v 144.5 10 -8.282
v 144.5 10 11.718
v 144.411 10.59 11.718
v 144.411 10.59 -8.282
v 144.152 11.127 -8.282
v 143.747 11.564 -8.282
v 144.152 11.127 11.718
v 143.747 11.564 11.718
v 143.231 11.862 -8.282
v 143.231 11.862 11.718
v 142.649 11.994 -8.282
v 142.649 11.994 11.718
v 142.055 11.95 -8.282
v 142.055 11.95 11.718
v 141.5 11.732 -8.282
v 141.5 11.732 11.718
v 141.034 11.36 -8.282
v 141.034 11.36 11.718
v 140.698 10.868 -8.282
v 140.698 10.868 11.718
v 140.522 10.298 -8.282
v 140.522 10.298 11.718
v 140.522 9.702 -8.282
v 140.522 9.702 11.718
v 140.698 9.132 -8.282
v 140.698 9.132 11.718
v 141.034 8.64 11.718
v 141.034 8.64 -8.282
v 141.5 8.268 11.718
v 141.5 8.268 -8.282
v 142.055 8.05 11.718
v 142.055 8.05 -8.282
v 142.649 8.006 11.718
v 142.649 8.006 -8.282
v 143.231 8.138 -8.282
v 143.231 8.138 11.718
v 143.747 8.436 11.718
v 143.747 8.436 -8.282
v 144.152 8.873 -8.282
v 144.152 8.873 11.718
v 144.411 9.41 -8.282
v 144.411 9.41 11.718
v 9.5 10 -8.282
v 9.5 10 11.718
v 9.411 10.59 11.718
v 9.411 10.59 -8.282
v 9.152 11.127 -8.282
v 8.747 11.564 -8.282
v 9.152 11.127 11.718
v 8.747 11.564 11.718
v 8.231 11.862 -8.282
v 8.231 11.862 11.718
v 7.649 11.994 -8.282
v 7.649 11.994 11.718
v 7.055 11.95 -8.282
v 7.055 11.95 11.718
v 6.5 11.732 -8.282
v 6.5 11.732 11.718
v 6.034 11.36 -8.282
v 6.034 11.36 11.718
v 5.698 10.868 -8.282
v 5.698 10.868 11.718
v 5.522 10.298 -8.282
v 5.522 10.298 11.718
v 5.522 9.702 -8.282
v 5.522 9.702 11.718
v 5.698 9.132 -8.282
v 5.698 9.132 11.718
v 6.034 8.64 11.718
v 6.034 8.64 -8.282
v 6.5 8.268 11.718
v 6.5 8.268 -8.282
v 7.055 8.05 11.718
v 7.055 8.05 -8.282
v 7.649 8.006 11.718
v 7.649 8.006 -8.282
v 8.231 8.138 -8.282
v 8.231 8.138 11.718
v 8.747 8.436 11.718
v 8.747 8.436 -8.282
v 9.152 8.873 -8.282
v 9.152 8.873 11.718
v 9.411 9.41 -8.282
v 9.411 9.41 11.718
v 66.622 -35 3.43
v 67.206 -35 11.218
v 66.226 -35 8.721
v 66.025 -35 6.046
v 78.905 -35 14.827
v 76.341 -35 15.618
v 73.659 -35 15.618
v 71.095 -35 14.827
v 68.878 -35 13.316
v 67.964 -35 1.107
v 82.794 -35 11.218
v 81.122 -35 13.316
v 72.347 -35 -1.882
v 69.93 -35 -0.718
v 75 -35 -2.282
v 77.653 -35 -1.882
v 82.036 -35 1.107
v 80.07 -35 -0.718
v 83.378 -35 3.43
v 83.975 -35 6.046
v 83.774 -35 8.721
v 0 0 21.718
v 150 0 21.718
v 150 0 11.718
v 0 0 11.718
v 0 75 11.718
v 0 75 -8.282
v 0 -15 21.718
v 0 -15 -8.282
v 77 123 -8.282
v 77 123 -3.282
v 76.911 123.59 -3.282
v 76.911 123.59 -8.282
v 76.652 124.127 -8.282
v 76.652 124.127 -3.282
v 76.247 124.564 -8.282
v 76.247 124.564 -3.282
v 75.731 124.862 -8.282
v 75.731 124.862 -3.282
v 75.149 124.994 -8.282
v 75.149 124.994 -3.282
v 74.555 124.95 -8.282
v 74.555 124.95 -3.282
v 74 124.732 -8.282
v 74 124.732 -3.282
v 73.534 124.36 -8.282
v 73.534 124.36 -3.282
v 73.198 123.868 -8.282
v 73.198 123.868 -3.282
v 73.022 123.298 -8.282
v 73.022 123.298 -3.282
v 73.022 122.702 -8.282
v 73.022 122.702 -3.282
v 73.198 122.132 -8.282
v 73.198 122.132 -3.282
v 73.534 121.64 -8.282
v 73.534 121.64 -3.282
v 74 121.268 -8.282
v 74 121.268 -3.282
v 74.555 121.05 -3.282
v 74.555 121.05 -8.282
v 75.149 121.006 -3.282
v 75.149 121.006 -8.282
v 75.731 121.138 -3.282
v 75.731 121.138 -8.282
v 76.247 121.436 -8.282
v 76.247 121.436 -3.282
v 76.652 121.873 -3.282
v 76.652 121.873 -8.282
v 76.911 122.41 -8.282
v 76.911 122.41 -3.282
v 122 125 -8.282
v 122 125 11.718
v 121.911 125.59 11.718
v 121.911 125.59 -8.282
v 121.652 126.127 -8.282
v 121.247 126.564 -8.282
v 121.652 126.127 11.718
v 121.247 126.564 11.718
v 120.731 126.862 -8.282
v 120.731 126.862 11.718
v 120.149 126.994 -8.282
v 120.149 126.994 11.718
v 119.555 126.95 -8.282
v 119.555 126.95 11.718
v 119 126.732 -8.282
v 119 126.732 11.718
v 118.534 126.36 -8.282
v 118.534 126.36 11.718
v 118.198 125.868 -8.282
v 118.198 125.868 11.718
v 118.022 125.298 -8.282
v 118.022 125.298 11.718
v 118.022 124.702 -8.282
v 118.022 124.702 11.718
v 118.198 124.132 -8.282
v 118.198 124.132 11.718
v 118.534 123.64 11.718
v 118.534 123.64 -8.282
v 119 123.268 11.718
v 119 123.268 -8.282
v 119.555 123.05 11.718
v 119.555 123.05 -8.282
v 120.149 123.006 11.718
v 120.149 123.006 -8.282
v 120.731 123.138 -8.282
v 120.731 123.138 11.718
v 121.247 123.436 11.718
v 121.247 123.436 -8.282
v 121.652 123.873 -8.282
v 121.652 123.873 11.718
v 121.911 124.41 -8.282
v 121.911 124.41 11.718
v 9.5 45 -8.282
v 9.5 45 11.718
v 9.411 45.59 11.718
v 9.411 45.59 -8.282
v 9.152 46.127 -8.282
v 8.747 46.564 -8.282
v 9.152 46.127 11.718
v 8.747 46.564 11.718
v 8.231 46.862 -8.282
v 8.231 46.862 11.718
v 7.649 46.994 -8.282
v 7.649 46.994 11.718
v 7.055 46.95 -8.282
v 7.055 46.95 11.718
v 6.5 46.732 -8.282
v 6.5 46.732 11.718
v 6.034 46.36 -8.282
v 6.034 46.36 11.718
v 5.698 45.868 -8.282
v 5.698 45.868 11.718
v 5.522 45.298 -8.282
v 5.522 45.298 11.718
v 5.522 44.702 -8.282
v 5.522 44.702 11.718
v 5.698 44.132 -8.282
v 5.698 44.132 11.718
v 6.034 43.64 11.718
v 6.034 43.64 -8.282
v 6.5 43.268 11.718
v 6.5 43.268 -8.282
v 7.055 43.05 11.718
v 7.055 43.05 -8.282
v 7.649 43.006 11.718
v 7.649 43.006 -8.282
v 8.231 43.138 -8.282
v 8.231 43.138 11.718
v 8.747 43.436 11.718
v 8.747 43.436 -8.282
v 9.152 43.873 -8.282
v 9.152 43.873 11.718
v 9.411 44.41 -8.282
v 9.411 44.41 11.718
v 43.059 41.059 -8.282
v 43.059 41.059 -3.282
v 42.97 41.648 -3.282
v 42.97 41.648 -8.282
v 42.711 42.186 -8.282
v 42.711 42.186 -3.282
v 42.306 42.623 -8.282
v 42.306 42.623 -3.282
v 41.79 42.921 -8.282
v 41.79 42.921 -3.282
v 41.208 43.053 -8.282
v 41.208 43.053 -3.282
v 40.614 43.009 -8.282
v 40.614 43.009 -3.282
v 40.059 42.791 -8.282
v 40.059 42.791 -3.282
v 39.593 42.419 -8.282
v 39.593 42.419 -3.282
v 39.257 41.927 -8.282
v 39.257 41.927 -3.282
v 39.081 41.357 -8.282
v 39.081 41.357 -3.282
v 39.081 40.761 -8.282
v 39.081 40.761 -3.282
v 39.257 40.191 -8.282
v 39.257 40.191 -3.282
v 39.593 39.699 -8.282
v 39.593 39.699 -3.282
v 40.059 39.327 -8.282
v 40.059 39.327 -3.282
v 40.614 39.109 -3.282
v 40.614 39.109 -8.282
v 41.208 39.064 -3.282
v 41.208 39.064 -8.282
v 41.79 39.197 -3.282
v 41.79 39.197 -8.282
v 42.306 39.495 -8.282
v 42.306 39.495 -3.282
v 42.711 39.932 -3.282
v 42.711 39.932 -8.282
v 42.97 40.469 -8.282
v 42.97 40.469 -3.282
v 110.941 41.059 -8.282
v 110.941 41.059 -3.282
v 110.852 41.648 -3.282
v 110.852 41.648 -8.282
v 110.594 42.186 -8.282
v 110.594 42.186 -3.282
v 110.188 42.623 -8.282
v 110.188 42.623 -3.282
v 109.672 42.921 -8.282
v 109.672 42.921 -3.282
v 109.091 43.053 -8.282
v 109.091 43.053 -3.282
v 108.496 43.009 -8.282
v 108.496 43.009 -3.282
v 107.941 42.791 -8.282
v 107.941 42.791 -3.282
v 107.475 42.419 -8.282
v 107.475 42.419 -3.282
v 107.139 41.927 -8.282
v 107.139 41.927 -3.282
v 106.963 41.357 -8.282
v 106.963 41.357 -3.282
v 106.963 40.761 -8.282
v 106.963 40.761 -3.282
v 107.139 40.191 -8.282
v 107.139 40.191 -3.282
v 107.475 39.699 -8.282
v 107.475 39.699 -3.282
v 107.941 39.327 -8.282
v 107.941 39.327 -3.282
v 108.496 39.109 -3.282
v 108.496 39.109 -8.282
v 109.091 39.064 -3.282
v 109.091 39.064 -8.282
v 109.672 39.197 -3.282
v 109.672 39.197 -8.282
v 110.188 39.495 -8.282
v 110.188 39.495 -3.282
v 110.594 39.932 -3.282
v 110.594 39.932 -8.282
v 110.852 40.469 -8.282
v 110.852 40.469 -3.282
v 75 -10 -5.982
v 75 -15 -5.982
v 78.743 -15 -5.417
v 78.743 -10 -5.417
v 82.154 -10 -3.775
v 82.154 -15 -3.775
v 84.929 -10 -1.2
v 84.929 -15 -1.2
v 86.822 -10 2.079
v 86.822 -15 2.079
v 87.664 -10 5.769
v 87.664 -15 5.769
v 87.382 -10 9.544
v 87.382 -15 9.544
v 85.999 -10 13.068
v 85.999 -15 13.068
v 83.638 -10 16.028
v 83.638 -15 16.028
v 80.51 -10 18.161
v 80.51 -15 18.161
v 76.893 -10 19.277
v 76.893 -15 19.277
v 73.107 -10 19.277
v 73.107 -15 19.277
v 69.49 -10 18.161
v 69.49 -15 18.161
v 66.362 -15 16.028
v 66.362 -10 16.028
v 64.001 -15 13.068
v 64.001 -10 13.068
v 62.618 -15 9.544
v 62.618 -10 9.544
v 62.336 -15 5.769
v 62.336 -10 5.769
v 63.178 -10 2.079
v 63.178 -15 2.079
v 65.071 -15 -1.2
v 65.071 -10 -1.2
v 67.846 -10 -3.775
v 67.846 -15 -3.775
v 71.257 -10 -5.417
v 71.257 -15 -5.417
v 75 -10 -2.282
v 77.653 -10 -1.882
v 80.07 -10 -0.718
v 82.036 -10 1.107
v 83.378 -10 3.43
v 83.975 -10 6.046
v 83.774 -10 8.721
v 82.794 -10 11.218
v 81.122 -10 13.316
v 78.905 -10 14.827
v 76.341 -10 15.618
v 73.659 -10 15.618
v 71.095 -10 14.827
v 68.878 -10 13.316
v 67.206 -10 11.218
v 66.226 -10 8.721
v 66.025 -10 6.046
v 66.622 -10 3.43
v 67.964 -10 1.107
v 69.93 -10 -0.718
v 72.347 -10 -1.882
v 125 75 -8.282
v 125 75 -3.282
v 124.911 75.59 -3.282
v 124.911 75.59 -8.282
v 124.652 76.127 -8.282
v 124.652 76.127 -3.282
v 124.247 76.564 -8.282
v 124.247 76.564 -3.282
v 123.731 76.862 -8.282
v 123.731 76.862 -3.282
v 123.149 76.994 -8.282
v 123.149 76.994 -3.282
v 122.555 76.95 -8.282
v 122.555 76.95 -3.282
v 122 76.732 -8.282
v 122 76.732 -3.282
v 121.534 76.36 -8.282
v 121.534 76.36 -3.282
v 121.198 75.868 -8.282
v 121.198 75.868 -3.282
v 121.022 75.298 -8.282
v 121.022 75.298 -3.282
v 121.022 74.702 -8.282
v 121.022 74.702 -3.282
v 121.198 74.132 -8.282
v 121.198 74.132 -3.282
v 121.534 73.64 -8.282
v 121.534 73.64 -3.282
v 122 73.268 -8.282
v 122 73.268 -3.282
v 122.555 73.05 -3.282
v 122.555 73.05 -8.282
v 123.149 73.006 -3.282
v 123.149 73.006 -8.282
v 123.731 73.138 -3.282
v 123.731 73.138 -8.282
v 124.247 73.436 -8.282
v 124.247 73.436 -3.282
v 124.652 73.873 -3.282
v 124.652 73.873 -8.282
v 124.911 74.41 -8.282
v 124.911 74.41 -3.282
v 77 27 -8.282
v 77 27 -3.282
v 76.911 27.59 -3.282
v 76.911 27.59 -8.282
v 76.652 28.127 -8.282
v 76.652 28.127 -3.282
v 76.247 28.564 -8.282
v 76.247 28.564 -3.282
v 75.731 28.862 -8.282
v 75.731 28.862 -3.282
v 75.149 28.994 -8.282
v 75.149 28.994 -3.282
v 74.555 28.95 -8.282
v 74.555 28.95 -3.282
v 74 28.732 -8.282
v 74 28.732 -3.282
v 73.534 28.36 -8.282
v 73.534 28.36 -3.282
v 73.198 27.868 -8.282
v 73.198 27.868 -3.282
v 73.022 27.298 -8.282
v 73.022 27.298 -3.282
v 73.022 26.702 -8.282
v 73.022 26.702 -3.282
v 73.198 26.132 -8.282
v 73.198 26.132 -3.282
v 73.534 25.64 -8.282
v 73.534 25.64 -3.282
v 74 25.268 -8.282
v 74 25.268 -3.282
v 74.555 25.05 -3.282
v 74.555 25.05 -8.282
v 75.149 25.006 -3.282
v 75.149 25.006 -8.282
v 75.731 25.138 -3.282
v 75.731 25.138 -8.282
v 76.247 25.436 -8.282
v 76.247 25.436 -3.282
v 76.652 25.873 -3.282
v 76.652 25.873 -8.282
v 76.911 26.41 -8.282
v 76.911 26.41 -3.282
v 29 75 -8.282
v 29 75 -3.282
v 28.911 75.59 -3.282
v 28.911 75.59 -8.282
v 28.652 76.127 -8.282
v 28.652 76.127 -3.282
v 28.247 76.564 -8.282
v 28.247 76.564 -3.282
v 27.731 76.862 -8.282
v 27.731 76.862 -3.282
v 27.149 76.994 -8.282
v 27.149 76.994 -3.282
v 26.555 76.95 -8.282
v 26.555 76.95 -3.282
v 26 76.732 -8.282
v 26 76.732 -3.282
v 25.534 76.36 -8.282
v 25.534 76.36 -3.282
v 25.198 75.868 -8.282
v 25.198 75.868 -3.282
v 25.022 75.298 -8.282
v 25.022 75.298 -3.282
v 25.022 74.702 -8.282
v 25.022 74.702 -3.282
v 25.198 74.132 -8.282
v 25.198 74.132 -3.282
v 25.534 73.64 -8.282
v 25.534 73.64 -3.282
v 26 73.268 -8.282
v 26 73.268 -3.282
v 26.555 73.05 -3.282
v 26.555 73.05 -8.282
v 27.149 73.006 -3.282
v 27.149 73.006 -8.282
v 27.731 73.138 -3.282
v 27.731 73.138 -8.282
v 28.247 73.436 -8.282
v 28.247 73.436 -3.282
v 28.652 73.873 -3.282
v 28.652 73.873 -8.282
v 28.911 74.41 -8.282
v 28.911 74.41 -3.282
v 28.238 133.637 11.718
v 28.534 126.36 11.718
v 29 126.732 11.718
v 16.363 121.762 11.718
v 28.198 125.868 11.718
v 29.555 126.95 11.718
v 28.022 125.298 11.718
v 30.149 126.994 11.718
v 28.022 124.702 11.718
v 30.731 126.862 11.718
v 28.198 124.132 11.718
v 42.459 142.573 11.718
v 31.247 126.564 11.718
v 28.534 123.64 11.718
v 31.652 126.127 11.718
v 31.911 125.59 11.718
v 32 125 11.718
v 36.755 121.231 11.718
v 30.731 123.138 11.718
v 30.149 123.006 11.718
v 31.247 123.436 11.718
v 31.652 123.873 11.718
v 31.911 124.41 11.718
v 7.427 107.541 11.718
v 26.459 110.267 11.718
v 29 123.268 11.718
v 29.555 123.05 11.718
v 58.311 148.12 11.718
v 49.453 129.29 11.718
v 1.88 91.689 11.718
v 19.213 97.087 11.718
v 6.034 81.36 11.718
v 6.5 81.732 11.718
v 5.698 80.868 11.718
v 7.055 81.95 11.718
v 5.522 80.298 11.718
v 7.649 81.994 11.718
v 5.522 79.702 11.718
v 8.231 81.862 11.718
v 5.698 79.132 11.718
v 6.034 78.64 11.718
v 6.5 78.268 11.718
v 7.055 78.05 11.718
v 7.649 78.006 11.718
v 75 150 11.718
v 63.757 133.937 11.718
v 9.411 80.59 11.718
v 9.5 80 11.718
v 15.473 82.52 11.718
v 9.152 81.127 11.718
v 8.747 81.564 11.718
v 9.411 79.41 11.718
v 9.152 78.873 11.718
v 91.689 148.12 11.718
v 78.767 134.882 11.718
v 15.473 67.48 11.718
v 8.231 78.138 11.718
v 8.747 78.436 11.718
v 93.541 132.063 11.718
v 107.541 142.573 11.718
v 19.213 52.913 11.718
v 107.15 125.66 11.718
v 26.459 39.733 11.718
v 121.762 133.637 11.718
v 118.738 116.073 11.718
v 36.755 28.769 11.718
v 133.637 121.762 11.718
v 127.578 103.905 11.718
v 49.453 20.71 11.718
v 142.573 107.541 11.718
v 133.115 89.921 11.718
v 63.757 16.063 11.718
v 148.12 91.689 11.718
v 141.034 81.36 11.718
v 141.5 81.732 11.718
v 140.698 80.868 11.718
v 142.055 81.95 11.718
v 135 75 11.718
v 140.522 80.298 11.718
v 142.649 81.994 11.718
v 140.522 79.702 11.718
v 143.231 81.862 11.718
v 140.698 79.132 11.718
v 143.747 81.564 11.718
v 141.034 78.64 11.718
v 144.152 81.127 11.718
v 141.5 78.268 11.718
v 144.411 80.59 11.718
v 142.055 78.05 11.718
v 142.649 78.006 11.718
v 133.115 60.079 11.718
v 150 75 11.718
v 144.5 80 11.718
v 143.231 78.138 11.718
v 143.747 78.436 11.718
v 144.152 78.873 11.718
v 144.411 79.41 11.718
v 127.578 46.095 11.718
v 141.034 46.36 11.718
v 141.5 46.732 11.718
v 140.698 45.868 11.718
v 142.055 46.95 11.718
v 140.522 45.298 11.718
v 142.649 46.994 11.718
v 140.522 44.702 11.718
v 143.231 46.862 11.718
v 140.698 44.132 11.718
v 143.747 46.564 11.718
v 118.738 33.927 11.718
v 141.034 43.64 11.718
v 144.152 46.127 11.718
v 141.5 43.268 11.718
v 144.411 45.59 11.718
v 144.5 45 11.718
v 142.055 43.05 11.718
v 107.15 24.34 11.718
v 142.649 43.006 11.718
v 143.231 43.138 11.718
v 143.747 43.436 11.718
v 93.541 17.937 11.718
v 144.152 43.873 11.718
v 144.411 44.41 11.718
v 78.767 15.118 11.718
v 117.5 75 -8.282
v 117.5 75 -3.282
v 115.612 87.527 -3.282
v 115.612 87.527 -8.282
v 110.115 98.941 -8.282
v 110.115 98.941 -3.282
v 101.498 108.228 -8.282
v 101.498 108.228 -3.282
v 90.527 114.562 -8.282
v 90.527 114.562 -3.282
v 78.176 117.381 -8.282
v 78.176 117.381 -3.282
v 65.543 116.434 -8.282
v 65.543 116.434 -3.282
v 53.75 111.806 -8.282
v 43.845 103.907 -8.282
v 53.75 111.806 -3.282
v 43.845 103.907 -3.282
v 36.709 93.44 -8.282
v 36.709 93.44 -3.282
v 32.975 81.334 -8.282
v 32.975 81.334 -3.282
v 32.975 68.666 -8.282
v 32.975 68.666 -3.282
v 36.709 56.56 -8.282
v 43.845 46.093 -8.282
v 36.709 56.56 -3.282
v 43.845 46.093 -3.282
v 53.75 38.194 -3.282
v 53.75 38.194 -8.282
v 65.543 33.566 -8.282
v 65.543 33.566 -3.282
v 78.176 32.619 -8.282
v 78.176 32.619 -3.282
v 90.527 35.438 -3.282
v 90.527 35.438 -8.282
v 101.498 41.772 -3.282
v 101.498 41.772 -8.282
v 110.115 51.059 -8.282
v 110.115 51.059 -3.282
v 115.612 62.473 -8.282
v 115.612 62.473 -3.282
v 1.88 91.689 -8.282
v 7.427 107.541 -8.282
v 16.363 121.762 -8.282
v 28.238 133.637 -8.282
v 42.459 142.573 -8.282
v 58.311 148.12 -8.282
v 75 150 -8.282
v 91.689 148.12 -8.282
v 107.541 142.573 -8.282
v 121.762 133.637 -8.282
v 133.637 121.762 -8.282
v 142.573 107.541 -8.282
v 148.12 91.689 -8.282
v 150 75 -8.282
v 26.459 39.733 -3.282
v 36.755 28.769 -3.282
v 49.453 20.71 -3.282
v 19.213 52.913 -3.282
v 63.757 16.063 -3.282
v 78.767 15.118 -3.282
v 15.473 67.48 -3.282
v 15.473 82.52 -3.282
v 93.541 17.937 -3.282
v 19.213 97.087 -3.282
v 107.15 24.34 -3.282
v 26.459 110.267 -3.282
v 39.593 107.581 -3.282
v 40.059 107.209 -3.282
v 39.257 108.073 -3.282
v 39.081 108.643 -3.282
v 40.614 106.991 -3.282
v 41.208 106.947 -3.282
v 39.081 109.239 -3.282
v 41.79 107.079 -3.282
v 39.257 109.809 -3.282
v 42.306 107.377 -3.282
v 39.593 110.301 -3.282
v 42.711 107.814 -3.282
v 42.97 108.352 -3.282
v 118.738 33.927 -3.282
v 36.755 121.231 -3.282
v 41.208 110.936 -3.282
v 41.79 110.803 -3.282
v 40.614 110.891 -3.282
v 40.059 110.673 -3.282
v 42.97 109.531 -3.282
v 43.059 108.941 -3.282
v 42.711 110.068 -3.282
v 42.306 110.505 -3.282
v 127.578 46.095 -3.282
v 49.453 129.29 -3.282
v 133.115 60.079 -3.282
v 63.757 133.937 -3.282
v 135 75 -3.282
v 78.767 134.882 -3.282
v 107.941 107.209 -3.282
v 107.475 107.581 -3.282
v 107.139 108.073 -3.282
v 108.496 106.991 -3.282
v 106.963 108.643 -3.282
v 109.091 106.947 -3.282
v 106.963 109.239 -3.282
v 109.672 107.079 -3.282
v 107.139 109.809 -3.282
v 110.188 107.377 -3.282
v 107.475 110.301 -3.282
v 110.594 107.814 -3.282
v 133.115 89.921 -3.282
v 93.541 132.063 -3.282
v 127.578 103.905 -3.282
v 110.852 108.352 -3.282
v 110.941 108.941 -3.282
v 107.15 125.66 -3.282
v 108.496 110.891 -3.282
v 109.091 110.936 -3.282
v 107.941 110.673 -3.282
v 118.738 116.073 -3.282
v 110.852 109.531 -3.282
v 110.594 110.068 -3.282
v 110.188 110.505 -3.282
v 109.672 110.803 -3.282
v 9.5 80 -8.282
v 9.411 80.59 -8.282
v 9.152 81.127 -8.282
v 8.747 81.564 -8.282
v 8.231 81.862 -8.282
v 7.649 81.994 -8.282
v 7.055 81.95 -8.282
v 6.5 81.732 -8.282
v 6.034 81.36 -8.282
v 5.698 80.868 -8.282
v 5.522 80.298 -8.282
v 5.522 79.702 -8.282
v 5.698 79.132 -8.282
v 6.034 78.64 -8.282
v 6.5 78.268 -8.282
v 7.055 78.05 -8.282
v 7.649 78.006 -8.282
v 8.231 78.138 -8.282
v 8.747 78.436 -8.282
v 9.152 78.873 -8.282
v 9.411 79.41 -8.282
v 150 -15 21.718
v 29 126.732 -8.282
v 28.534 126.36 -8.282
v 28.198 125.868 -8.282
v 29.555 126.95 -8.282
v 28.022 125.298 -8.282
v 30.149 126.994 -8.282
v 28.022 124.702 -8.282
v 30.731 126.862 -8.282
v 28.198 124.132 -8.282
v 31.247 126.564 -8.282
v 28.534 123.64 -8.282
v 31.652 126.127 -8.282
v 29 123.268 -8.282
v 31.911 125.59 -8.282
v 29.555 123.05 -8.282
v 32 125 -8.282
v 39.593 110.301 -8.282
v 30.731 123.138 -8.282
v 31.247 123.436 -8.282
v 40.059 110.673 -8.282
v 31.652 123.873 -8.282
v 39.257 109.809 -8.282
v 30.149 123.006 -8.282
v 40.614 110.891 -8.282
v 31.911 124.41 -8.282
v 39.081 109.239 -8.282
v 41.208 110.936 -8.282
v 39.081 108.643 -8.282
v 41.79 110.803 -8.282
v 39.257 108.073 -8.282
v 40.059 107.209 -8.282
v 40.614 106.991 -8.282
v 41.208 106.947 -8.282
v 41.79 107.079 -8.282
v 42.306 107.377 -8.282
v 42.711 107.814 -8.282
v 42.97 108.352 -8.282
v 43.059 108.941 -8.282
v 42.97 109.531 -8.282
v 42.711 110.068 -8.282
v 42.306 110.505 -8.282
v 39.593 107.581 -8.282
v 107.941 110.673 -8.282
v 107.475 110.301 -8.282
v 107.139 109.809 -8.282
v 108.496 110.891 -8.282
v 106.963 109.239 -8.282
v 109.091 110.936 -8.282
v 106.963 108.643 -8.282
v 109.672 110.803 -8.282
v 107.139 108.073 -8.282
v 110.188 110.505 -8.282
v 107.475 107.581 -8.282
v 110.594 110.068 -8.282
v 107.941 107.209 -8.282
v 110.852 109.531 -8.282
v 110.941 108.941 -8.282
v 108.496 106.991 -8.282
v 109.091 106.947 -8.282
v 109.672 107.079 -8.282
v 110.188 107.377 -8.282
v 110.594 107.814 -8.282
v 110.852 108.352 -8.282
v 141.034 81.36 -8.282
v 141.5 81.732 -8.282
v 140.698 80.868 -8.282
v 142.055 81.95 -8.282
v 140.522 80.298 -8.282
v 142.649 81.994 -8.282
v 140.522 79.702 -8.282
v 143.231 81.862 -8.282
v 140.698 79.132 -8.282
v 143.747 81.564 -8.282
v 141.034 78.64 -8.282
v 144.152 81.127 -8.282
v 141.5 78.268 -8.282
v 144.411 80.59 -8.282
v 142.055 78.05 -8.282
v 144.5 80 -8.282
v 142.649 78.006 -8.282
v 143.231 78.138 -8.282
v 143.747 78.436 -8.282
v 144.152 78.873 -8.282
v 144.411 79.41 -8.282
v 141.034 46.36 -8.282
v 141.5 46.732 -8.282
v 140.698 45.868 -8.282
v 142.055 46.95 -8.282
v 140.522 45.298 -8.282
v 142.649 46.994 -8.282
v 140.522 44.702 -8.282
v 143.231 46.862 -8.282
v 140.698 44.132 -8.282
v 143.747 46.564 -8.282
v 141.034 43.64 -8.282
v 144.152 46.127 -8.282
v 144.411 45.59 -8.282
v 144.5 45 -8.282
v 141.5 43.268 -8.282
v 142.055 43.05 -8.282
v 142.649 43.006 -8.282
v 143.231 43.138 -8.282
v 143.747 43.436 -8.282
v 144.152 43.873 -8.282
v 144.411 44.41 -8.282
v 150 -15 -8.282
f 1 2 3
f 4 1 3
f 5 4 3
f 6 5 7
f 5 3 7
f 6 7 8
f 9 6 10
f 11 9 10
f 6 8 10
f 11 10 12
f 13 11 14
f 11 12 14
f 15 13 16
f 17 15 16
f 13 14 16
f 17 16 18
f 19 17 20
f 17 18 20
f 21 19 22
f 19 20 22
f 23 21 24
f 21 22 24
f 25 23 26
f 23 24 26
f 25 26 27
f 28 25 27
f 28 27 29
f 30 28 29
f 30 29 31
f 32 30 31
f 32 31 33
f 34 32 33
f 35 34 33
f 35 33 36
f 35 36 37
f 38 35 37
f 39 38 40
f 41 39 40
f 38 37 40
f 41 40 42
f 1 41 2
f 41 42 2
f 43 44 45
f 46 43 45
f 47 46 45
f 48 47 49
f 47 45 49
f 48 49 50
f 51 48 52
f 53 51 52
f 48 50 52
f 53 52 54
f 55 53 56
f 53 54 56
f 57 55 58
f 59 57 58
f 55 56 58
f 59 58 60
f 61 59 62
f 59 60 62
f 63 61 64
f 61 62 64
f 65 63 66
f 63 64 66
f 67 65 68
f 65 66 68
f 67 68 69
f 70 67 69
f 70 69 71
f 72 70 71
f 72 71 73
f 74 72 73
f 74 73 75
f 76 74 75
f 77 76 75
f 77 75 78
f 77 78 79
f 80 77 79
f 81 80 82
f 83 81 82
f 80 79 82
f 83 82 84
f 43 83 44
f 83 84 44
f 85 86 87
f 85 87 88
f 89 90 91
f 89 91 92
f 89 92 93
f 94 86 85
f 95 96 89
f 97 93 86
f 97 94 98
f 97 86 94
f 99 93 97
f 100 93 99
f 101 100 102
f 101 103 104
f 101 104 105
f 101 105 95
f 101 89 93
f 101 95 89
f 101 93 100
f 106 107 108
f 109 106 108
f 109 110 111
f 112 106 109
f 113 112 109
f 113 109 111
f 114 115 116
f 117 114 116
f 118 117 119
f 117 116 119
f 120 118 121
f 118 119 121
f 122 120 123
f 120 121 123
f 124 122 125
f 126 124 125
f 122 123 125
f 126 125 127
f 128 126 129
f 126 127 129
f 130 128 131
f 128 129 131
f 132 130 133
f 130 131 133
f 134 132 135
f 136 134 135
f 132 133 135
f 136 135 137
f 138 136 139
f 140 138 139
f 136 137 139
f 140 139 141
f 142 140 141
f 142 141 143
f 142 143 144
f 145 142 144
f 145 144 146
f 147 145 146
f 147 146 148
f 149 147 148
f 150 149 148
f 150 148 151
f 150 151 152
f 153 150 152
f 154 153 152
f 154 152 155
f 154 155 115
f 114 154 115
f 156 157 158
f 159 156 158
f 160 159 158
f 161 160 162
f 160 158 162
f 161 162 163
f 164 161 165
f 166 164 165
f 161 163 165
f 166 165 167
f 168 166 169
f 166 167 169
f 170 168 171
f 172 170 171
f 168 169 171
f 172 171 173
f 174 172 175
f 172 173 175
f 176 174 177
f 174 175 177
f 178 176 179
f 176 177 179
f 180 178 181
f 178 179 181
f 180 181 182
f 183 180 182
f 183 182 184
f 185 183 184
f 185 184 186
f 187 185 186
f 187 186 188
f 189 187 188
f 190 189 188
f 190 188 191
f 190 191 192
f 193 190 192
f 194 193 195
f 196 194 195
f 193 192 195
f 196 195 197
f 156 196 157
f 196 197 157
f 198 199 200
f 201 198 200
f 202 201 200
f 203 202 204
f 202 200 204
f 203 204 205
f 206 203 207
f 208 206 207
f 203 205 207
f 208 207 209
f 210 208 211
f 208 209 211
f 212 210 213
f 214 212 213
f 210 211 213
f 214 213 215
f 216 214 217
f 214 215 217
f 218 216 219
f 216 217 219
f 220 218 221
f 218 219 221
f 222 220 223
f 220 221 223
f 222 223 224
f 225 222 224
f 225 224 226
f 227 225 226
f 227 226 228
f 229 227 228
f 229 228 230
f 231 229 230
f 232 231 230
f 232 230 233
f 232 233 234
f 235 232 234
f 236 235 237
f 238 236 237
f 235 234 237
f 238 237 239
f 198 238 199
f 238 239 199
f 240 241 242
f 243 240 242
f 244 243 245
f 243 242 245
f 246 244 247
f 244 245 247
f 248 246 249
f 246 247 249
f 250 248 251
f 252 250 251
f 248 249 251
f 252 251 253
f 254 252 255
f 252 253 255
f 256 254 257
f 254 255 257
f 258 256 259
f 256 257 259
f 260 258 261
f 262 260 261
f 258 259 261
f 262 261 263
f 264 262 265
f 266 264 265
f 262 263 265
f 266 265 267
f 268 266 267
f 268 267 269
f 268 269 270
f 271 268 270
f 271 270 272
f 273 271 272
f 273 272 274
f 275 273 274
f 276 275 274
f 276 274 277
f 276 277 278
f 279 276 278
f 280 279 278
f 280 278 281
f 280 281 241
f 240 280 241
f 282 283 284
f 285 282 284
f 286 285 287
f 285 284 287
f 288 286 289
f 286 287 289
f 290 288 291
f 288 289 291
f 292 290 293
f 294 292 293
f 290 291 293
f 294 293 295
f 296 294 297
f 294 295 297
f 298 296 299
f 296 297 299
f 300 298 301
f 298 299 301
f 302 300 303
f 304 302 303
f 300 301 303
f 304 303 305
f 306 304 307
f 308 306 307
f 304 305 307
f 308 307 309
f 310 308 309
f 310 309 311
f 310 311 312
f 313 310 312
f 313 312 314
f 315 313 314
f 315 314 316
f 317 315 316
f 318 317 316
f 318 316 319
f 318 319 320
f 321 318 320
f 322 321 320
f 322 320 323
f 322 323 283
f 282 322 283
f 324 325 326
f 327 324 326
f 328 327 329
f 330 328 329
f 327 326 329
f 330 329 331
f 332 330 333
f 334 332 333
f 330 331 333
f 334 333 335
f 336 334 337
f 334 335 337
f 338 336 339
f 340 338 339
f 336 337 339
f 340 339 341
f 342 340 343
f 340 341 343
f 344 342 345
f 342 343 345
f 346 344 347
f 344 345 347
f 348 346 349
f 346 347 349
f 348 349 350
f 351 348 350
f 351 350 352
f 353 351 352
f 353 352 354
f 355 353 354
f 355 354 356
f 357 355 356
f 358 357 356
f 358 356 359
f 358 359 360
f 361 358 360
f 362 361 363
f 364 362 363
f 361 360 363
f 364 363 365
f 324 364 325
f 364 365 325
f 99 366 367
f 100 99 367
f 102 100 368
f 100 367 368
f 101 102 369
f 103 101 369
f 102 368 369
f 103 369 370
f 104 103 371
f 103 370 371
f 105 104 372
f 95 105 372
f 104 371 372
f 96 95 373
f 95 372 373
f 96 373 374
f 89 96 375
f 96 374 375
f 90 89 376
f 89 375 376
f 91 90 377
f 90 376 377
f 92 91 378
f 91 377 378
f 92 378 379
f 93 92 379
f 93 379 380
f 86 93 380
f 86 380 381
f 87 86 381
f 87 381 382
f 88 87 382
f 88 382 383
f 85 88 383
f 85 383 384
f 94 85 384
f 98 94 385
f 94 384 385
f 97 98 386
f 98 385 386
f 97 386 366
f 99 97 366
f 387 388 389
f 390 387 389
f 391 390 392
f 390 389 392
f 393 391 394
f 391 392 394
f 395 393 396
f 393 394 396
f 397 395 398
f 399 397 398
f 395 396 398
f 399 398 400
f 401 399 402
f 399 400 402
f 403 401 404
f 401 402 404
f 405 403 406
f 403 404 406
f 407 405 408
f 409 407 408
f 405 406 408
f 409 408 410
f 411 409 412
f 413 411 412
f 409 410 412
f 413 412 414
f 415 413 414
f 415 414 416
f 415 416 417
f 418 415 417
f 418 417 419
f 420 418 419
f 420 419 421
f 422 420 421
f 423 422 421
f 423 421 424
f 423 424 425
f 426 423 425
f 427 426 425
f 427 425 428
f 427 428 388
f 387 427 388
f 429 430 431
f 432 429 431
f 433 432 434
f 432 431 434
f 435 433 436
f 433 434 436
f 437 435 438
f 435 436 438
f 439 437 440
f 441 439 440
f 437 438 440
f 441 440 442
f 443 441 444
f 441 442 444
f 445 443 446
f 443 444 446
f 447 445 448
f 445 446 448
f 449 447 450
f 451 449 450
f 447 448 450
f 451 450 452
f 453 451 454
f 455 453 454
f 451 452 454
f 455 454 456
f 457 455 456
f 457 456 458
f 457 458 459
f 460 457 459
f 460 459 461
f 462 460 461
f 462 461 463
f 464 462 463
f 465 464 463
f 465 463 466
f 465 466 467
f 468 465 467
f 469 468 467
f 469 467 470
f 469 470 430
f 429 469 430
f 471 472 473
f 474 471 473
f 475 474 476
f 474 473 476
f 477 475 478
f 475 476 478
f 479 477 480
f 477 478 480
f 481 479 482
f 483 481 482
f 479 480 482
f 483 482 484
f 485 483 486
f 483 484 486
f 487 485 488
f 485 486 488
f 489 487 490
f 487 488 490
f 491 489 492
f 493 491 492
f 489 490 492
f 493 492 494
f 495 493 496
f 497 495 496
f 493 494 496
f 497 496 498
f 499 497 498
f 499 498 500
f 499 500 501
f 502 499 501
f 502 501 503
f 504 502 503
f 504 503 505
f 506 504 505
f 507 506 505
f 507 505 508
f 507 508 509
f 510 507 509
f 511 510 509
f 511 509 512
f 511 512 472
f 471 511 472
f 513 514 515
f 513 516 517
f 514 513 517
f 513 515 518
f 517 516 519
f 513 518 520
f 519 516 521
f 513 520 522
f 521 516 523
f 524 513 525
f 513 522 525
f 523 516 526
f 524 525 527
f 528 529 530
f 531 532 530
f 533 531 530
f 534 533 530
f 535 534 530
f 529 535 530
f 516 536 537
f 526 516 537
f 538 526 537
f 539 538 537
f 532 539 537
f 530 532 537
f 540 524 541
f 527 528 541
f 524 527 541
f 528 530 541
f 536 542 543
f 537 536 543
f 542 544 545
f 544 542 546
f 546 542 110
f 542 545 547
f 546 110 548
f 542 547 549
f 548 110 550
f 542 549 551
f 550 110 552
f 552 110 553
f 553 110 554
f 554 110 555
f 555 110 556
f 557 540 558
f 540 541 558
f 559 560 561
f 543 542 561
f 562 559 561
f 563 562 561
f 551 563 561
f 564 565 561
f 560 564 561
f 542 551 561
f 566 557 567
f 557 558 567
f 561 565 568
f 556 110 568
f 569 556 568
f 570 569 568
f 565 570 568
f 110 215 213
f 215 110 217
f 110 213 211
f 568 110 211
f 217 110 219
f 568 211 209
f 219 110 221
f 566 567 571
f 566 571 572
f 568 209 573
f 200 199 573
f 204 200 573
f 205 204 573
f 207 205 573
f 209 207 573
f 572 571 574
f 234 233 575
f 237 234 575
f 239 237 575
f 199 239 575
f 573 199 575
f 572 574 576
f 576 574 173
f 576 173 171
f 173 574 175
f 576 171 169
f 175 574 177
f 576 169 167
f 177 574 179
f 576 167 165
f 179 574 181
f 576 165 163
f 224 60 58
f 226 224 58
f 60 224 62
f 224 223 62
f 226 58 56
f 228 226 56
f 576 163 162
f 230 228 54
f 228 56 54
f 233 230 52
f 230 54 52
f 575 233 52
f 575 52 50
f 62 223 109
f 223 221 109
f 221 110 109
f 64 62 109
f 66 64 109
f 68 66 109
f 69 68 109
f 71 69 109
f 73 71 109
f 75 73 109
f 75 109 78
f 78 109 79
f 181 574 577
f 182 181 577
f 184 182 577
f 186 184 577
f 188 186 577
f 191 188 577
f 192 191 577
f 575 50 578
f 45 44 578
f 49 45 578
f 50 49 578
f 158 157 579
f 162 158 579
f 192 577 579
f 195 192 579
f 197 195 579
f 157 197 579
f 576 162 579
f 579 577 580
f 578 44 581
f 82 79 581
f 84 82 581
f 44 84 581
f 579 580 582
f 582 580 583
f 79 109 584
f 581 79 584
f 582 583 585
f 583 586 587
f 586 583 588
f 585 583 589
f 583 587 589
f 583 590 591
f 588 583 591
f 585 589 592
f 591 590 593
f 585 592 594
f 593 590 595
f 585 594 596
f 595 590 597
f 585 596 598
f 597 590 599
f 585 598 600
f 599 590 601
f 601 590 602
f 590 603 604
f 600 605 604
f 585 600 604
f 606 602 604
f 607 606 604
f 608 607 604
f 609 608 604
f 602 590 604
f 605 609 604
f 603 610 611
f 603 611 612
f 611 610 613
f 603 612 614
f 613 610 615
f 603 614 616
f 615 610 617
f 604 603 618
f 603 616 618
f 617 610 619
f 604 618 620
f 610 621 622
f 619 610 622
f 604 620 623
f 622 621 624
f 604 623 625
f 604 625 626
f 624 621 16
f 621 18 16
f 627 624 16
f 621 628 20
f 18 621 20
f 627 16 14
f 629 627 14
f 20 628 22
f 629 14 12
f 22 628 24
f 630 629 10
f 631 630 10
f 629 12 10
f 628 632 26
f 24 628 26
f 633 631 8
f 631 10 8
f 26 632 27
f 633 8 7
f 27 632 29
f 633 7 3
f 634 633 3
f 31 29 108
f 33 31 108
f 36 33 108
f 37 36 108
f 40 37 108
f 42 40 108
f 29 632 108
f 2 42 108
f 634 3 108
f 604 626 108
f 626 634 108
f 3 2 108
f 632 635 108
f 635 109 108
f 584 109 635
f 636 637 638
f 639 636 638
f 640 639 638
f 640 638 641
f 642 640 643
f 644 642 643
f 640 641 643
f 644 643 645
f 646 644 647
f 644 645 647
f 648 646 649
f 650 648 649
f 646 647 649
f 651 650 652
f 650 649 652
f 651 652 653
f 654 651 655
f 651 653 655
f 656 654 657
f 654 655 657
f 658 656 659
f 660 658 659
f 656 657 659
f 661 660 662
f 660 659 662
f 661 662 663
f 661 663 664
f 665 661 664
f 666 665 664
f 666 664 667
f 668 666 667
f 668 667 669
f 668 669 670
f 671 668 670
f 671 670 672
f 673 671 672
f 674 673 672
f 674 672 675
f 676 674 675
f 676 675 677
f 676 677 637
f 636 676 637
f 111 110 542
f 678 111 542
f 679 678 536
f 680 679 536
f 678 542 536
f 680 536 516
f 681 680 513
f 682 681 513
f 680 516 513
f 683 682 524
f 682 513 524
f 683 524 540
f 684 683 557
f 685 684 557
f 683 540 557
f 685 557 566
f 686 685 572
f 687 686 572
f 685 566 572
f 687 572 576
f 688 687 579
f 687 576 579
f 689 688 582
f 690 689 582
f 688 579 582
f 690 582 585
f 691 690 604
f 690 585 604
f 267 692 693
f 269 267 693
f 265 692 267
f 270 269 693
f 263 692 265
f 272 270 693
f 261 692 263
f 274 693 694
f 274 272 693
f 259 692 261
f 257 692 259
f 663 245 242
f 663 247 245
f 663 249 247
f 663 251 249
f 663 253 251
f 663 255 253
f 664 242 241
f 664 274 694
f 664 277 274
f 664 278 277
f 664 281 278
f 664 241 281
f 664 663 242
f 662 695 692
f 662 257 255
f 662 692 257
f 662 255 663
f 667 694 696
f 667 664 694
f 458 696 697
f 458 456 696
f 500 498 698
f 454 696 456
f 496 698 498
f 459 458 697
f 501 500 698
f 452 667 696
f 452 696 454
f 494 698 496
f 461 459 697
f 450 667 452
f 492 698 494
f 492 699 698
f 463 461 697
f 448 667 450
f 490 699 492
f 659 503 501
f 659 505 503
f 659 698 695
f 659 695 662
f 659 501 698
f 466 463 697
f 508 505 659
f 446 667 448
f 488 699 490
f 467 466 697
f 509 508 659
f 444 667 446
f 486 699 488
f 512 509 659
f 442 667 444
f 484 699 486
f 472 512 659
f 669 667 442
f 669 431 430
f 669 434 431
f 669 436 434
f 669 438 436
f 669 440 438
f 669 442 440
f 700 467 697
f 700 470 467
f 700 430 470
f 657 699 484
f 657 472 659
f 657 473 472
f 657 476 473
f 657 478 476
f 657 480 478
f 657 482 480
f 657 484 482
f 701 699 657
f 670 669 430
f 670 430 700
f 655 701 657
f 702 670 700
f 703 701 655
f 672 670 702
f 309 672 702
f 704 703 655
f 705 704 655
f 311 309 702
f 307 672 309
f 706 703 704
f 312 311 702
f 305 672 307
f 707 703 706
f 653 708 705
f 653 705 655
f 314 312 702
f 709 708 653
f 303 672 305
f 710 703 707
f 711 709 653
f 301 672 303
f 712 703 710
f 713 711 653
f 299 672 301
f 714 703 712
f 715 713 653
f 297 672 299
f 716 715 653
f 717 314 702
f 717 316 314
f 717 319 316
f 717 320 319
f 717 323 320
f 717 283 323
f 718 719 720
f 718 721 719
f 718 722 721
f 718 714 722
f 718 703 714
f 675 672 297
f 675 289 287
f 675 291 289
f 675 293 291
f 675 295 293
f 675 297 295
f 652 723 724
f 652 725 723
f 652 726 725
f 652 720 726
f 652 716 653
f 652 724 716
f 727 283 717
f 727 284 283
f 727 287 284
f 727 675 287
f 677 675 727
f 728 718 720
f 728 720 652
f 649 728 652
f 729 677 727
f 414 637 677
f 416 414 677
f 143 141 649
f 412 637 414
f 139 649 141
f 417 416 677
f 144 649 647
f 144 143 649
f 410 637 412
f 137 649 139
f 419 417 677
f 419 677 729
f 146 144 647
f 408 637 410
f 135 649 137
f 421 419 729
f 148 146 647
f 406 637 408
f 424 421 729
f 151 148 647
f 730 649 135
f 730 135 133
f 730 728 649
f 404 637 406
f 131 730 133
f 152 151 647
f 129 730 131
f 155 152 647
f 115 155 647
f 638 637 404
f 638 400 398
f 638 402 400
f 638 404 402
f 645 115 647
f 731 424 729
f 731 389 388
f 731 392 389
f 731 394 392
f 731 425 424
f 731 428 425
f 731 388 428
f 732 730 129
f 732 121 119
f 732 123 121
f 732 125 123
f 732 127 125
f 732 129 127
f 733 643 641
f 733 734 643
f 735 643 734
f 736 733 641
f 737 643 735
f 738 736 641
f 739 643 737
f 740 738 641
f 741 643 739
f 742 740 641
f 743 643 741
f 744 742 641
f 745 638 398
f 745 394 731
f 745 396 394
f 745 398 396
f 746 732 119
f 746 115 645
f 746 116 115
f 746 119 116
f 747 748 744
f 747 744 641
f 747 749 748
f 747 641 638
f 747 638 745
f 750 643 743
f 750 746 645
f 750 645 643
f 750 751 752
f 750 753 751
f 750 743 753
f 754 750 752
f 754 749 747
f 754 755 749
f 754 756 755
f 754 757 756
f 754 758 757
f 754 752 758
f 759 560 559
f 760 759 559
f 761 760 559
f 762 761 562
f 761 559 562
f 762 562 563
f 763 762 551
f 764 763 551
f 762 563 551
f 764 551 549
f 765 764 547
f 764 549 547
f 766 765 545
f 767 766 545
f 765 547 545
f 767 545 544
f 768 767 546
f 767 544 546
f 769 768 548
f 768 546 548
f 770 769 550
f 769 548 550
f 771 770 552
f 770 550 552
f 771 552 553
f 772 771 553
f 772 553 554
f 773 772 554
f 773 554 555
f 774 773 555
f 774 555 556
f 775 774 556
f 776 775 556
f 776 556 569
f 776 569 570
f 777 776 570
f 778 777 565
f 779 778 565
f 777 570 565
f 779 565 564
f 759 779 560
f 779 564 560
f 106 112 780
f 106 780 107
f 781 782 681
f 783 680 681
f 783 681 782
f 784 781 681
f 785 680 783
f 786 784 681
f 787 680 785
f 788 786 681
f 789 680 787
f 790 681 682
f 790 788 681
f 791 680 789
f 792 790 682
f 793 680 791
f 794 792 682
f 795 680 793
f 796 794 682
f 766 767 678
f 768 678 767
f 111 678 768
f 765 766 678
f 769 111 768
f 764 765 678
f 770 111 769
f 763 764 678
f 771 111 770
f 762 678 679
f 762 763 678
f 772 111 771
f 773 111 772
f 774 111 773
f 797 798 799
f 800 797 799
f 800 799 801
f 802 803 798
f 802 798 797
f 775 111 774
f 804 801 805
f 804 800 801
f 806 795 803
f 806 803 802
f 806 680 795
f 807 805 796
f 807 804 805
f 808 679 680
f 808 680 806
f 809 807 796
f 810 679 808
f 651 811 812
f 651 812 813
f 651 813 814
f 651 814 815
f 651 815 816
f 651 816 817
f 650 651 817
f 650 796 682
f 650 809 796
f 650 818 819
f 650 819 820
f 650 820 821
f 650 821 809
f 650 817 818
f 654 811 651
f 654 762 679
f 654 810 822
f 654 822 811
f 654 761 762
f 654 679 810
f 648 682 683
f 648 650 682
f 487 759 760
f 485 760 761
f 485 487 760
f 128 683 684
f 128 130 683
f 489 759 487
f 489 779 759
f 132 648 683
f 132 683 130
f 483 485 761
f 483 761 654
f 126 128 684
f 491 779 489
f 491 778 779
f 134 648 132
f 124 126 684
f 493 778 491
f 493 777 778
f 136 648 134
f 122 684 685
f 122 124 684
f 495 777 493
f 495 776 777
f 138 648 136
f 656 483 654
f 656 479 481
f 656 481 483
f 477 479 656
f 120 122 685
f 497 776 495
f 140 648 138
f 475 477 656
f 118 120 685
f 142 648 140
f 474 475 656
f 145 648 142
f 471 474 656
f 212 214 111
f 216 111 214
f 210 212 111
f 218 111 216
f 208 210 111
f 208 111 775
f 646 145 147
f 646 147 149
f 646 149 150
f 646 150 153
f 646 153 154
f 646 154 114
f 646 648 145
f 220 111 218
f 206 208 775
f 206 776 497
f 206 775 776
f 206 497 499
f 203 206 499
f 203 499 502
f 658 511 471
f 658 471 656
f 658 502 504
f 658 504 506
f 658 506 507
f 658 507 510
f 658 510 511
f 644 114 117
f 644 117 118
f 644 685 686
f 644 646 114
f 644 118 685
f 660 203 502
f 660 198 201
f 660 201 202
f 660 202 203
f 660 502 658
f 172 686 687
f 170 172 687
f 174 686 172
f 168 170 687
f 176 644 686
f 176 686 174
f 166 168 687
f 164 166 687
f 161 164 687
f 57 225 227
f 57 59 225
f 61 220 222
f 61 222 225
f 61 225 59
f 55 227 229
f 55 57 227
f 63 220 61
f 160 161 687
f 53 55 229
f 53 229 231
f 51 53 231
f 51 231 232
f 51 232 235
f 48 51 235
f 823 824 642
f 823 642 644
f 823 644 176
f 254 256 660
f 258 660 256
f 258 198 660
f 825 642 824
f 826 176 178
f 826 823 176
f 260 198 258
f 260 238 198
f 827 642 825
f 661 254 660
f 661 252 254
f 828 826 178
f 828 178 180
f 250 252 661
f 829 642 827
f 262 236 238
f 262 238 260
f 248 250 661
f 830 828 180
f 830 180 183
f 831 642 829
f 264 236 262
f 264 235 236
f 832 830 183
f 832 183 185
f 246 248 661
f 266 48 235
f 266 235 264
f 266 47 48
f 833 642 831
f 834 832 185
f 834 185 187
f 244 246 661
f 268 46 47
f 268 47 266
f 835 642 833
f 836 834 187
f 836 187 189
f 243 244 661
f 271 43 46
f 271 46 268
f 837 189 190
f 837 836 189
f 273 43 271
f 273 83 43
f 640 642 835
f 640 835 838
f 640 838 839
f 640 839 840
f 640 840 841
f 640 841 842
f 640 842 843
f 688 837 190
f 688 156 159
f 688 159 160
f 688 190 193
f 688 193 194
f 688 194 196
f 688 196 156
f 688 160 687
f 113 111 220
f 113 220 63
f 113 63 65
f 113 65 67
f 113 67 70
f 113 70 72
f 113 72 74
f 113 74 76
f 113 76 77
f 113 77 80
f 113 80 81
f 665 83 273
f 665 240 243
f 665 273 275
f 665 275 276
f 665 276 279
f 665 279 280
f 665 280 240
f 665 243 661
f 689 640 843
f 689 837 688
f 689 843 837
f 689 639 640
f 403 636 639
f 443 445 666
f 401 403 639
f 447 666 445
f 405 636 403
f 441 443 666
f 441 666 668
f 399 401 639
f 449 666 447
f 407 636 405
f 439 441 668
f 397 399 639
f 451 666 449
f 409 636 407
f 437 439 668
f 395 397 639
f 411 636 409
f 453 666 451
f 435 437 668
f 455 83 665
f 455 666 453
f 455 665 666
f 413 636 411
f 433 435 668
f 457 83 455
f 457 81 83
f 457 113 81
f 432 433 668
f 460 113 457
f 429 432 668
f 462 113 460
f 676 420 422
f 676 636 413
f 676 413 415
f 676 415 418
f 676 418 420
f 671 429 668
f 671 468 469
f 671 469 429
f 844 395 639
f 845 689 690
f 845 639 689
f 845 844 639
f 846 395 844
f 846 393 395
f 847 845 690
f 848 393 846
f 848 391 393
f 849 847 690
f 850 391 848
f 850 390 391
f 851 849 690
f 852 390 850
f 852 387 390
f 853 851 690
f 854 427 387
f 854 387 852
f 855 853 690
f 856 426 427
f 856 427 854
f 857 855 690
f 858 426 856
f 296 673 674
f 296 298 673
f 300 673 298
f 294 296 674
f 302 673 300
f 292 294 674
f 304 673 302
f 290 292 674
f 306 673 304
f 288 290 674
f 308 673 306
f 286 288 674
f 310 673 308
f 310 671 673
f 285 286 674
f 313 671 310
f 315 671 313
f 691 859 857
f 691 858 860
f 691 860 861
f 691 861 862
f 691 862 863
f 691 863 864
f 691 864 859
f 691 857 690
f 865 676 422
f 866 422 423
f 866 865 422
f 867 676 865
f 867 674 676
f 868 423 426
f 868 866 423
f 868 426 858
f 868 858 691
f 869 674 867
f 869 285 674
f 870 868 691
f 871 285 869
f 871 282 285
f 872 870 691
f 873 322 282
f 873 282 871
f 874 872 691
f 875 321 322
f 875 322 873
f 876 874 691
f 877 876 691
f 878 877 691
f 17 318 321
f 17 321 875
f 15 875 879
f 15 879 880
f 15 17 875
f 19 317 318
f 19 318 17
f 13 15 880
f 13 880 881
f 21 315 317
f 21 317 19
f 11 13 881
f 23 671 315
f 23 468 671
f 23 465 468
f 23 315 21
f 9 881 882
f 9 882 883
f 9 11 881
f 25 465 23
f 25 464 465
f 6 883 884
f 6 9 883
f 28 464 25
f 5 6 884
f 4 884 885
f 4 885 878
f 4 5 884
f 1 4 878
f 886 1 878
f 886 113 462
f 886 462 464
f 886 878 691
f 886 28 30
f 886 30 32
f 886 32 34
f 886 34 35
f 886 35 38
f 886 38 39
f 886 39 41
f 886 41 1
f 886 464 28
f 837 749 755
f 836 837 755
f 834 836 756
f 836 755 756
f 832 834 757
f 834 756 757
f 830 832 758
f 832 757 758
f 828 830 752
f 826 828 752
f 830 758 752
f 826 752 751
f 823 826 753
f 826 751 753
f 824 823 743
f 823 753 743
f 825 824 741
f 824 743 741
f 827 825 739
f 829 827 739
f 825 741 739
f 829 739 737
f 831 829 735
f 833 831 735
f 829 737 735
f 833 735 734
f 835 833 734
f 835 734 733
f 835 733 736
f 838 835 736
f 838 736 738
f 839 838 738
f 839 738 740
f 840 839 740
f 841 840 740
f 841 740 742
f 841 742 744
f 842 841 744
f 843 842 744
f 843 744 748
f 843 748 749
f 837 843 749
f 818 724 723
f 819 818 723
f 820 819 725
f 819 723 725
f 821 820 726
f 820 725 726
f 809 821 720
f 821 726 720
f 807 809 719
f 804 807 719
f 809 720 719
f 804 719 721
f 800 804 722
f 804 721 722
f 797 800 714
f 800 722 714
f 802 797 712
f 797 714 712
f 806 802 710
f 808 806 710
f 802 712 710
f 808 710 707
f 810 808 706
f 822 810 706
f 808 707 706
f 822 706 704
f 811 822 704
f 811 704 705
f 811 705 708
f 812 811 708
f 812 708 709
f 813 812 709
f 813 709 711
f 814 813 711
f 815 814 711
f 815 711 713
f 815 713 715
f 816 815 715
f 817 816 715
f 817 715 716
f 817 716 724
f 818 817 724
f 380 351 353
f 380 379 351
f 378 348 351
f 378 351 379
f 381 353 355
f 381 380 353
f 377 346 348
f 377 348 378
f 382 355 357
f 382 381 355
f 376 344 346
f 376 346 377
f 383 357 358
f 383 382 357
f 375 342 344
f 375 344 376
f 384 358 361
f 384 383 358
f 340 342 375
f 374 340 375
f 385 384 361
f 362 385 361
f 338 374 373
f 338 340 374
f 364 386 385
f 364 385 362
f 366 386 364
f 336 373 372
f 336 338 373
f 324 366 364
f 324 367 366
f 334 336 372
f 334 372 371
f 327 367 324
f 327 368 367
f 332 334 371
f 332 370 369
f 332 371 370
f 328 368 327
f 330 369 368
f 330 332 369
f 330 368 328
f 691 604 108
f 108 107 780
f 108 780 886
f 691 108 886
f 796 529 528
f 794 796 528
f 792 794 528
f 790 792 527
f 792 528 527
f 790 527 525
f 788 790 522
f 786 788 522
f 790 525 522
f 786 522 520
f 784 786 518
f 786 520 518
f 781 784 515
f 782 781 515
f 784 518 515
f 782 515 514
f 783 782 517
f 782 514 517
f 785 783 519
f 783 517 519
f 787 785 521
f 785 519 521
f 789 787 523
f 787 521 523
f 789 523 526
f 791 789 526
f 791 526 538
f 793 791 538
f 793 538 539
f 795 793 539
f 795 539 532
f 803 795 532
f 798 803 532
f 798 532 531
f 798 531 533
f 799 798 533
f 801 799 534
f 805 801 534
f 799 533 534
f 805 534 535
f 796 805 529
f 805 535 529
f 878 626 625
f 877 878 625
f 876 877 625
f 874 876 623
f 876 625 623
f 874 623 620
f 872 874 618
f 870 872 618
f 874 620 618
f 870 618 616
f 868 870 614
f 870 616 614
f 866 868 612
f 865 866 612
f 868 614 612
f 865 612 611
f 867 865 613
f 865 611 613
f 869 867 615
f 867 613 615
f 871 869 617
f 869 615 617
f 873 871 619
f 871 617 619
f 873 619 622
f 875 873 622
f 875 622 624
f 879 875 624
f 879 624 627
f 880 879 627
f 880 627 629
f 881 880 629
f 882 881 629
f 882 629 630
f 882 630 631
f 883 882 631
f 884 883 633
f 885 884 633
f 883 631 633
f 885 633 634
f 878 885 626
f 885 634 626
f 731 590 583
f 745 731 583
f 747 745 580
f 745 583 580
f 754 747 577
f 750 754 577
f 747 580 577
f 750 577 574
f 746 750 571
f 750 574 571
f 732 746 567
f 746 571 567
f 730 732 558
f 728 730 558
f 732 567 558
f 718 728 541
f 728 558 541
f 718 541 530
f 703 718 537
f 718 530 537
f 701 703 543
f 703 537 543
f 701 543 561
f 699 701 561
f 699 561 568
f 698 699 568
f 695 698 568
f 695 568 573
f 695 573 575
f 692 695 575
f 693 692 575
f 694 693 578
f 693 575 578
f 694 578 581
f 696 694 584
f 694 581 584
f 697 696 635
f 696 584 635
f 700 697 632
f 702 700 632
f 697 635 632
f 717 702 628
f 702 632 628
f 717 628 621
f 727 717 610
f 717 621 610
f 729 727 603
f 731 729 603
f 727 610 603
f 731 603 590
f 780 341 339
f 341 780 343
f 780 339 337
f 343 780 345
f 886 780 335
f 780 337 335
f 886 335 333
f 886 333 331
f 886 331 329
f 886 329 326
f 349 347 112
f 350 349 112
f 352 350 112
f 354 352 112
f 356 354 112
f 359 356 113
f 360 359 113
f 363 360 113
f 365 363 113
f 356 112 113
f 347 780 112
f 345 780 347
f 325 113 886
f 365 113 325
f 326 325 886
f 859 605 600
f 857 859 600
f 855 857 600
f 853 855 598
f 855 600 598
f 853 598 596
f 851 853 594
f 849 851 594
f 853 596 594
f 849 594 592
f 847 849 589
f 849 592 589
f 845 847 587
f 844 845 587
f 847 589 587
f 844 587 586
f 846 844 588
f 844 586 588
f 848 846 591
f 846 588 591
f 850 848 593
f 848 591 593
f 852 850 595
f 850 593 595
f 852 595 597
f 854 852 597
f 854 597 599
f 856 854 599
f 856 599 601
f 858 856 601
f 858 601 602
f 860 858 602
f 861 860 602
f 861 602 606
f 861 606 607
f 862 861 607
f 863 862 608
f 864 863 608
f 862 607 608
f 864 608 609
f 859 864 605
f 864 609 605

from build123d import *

# Parameters (mm, degrees)
SKETCH1_W           = 30
SKETCH1_H           = 15
BOSS_EXTRUDE1_DEPTH = 150
SKETCH2_R           = 12.7
CUT_EXTRUDE1_DEPTH  = 5
SKETCH3_R           = 9
BOSS_EXTRUDE2_DEPTH = 25
SKETCH4_W           = 150
SKETCH4_H           = 20
BOSS_EXTRUDE3_DEPTH = 150
SKETCH5_R           = 42.5
CUT_EXTRUDE2_DEPTH  = 150
SKETCH6_R           = 60
CUT_EXTRUDE3_DEPTH  = 15
SKETCH7_R           = 2
CUT_EXTRUDE4_DEPTH  = 15
SKETCH17_R          = 2
CUT_EXTRUDE5_DEPTH  = 20
SKETCH18_R          = 2
CUT_EXTRUDE6_DEPTH  = 20


with BuildPart() as part:
    # Sketch1 → Boss-Extrude1 (new body)
    with BuildSketch(Plane(origin=(0, 0, 0), x_dir=(0, 0, -1), z_dir=(1, 0, 0))):
        with Locations((-6.718464351, -7.5)):
            Rectangle(SKETCH1_W, SKETCH1_H)
    extrude(amount=BOSS_EXTRUDE1_DEPTH)

    # Sketch2 → Cut-Extrude1 (cut)
    with BuildSketch(Plane.XZ.offset(15)):
        with Locations(Location((75, 6.718464351, 0), (0, 0, 270))):
            Circle(SKETCH2_R)
    extrude(amount=-CUT_EXTRUDE1_DEPTH, mode=Mode.SUBTRACT)

    # Sketch3 → Boss-Extrude2 (add)
    with BuildSketch(Plane.XZ.offset(10)):
        with Locations(Location((75, 6.718464351, 0), (0, 0, 270))):
            Circle(SKETCH3_R)
    extrude(amount=BOSS_EXTRUDE2_DEPTH)

    # Sketch4 → Boss-Extrude3 (add)
    with BuildSketch(Plane(origin=(0, 0, 0), x_dir=(1, 0, 0), z_dir=(0, 1, 0))):
        with Locations((75, -1.718464351)):
            Rectangle(SKETCH4_W, SKETCH4_H)
    extrude(amount=BOSS_EXTRUDE3_DEPTH)

    # Sketch5 → Cut-Extrude2 (cut)
    with BuildSketch(Plane.XY.offset(11.718464351)):
        with BuildLine():
            Line((75, 150), (0, 150))
            Line((0, 150), (0, 75))
            ThreePointArc((0, 75), (21.966991411, 128.033008589), (75, 150))
        make_face()
        with BuildLine():
            Line((150, 150), (75, 150))
            ThreePointArc((75, 150), (128.033008589, 128.033008589), (150, 75))
            Line((150, 75), (150, 150))
        make_face()
        with Locations((75, 75)):
            Circle(SKETCH5_R)
    extrude(amount=-CUT_EXTRUDE2_DEPTH, mode=Mode.SUBTRACT)

    # Sketch6 → Cut-Extrude3 (cut)
    with BuildSketch(Plane.XY.offset(11.718464351)):
        with Locations((75, 75)):
            Circle(SKETCH6_R)
    extrude(amount=-CUT_EXTRUDE3_DEPTH, mode=Mode.SUBTRACT)

    # Sketch7 → Cut-Extrude4 (cut)
    with BuildSketch(Plane.XY.offset(-3.281535649)):
        with Locations((75, 123)):
            Circle(SKETCH7_R)
        with Locations((108.941125497, 108.941125497)):
            Circle(SKETCH7_R)
        with Locations((123, 75)):
            Circle(SKETCH7_R)
        with Locations((108.941125497, 41.058874503)):
            Circle(SKETCH7_R)
        with Locations((75, 27)):
            Circle(SKETCH7_R)
        with Locations((41.058874503, 41.058874503)):
            Circle(SKETCH7_R)
        with Locations((27, 75)):
            Circle(SKETCH7_R)
        with Locations((41.058874503, 108.941125497)):
            Circle(SKETCH7_R)
    extrude(amount=-CUT_EXTRUDE4_DEPTH, mode=Mode.SUBTRACT)

    # Sketch17 → Cut-Extrude5 (cut)
    with BuildSketch(Plane.XY.offset(11.718464351)):
        with Locations((7.5, 10)):
            Circle(SKETCH17_R)
        with Locations((142.5, 10)):
            Circle(SKETCH17_R)
        with Locations((142.5, 45)):
            Circle(SKETCH17_R)
        with Locations((142.5, 80)):
            Circle(SKETCH17_R)
        with Locations((7.5, 45)):
            Circle(SKETCH17_R)
        with Locations((7.5, 80)):
            Circle(SKETCH17_R)
    extrude(amount=-CUT_EXTRUDE5_DEPTH, mode=Mode.SUBTRACT)

    # Sketch18 → Cut-Extrude6 (cut)
    with BuildSketch(Plane.XY.offset(11.718464351)):
        with Locations((30, 125)):
            Circle(SKETCH18_R)
        with Locations((120, 125)):
            Circle(SKETCH18_R)
    extrude(amount=-CUT_EXTRUDE6_DEPTH, mode=Mode.SUBTRACT)


solid = part.part
